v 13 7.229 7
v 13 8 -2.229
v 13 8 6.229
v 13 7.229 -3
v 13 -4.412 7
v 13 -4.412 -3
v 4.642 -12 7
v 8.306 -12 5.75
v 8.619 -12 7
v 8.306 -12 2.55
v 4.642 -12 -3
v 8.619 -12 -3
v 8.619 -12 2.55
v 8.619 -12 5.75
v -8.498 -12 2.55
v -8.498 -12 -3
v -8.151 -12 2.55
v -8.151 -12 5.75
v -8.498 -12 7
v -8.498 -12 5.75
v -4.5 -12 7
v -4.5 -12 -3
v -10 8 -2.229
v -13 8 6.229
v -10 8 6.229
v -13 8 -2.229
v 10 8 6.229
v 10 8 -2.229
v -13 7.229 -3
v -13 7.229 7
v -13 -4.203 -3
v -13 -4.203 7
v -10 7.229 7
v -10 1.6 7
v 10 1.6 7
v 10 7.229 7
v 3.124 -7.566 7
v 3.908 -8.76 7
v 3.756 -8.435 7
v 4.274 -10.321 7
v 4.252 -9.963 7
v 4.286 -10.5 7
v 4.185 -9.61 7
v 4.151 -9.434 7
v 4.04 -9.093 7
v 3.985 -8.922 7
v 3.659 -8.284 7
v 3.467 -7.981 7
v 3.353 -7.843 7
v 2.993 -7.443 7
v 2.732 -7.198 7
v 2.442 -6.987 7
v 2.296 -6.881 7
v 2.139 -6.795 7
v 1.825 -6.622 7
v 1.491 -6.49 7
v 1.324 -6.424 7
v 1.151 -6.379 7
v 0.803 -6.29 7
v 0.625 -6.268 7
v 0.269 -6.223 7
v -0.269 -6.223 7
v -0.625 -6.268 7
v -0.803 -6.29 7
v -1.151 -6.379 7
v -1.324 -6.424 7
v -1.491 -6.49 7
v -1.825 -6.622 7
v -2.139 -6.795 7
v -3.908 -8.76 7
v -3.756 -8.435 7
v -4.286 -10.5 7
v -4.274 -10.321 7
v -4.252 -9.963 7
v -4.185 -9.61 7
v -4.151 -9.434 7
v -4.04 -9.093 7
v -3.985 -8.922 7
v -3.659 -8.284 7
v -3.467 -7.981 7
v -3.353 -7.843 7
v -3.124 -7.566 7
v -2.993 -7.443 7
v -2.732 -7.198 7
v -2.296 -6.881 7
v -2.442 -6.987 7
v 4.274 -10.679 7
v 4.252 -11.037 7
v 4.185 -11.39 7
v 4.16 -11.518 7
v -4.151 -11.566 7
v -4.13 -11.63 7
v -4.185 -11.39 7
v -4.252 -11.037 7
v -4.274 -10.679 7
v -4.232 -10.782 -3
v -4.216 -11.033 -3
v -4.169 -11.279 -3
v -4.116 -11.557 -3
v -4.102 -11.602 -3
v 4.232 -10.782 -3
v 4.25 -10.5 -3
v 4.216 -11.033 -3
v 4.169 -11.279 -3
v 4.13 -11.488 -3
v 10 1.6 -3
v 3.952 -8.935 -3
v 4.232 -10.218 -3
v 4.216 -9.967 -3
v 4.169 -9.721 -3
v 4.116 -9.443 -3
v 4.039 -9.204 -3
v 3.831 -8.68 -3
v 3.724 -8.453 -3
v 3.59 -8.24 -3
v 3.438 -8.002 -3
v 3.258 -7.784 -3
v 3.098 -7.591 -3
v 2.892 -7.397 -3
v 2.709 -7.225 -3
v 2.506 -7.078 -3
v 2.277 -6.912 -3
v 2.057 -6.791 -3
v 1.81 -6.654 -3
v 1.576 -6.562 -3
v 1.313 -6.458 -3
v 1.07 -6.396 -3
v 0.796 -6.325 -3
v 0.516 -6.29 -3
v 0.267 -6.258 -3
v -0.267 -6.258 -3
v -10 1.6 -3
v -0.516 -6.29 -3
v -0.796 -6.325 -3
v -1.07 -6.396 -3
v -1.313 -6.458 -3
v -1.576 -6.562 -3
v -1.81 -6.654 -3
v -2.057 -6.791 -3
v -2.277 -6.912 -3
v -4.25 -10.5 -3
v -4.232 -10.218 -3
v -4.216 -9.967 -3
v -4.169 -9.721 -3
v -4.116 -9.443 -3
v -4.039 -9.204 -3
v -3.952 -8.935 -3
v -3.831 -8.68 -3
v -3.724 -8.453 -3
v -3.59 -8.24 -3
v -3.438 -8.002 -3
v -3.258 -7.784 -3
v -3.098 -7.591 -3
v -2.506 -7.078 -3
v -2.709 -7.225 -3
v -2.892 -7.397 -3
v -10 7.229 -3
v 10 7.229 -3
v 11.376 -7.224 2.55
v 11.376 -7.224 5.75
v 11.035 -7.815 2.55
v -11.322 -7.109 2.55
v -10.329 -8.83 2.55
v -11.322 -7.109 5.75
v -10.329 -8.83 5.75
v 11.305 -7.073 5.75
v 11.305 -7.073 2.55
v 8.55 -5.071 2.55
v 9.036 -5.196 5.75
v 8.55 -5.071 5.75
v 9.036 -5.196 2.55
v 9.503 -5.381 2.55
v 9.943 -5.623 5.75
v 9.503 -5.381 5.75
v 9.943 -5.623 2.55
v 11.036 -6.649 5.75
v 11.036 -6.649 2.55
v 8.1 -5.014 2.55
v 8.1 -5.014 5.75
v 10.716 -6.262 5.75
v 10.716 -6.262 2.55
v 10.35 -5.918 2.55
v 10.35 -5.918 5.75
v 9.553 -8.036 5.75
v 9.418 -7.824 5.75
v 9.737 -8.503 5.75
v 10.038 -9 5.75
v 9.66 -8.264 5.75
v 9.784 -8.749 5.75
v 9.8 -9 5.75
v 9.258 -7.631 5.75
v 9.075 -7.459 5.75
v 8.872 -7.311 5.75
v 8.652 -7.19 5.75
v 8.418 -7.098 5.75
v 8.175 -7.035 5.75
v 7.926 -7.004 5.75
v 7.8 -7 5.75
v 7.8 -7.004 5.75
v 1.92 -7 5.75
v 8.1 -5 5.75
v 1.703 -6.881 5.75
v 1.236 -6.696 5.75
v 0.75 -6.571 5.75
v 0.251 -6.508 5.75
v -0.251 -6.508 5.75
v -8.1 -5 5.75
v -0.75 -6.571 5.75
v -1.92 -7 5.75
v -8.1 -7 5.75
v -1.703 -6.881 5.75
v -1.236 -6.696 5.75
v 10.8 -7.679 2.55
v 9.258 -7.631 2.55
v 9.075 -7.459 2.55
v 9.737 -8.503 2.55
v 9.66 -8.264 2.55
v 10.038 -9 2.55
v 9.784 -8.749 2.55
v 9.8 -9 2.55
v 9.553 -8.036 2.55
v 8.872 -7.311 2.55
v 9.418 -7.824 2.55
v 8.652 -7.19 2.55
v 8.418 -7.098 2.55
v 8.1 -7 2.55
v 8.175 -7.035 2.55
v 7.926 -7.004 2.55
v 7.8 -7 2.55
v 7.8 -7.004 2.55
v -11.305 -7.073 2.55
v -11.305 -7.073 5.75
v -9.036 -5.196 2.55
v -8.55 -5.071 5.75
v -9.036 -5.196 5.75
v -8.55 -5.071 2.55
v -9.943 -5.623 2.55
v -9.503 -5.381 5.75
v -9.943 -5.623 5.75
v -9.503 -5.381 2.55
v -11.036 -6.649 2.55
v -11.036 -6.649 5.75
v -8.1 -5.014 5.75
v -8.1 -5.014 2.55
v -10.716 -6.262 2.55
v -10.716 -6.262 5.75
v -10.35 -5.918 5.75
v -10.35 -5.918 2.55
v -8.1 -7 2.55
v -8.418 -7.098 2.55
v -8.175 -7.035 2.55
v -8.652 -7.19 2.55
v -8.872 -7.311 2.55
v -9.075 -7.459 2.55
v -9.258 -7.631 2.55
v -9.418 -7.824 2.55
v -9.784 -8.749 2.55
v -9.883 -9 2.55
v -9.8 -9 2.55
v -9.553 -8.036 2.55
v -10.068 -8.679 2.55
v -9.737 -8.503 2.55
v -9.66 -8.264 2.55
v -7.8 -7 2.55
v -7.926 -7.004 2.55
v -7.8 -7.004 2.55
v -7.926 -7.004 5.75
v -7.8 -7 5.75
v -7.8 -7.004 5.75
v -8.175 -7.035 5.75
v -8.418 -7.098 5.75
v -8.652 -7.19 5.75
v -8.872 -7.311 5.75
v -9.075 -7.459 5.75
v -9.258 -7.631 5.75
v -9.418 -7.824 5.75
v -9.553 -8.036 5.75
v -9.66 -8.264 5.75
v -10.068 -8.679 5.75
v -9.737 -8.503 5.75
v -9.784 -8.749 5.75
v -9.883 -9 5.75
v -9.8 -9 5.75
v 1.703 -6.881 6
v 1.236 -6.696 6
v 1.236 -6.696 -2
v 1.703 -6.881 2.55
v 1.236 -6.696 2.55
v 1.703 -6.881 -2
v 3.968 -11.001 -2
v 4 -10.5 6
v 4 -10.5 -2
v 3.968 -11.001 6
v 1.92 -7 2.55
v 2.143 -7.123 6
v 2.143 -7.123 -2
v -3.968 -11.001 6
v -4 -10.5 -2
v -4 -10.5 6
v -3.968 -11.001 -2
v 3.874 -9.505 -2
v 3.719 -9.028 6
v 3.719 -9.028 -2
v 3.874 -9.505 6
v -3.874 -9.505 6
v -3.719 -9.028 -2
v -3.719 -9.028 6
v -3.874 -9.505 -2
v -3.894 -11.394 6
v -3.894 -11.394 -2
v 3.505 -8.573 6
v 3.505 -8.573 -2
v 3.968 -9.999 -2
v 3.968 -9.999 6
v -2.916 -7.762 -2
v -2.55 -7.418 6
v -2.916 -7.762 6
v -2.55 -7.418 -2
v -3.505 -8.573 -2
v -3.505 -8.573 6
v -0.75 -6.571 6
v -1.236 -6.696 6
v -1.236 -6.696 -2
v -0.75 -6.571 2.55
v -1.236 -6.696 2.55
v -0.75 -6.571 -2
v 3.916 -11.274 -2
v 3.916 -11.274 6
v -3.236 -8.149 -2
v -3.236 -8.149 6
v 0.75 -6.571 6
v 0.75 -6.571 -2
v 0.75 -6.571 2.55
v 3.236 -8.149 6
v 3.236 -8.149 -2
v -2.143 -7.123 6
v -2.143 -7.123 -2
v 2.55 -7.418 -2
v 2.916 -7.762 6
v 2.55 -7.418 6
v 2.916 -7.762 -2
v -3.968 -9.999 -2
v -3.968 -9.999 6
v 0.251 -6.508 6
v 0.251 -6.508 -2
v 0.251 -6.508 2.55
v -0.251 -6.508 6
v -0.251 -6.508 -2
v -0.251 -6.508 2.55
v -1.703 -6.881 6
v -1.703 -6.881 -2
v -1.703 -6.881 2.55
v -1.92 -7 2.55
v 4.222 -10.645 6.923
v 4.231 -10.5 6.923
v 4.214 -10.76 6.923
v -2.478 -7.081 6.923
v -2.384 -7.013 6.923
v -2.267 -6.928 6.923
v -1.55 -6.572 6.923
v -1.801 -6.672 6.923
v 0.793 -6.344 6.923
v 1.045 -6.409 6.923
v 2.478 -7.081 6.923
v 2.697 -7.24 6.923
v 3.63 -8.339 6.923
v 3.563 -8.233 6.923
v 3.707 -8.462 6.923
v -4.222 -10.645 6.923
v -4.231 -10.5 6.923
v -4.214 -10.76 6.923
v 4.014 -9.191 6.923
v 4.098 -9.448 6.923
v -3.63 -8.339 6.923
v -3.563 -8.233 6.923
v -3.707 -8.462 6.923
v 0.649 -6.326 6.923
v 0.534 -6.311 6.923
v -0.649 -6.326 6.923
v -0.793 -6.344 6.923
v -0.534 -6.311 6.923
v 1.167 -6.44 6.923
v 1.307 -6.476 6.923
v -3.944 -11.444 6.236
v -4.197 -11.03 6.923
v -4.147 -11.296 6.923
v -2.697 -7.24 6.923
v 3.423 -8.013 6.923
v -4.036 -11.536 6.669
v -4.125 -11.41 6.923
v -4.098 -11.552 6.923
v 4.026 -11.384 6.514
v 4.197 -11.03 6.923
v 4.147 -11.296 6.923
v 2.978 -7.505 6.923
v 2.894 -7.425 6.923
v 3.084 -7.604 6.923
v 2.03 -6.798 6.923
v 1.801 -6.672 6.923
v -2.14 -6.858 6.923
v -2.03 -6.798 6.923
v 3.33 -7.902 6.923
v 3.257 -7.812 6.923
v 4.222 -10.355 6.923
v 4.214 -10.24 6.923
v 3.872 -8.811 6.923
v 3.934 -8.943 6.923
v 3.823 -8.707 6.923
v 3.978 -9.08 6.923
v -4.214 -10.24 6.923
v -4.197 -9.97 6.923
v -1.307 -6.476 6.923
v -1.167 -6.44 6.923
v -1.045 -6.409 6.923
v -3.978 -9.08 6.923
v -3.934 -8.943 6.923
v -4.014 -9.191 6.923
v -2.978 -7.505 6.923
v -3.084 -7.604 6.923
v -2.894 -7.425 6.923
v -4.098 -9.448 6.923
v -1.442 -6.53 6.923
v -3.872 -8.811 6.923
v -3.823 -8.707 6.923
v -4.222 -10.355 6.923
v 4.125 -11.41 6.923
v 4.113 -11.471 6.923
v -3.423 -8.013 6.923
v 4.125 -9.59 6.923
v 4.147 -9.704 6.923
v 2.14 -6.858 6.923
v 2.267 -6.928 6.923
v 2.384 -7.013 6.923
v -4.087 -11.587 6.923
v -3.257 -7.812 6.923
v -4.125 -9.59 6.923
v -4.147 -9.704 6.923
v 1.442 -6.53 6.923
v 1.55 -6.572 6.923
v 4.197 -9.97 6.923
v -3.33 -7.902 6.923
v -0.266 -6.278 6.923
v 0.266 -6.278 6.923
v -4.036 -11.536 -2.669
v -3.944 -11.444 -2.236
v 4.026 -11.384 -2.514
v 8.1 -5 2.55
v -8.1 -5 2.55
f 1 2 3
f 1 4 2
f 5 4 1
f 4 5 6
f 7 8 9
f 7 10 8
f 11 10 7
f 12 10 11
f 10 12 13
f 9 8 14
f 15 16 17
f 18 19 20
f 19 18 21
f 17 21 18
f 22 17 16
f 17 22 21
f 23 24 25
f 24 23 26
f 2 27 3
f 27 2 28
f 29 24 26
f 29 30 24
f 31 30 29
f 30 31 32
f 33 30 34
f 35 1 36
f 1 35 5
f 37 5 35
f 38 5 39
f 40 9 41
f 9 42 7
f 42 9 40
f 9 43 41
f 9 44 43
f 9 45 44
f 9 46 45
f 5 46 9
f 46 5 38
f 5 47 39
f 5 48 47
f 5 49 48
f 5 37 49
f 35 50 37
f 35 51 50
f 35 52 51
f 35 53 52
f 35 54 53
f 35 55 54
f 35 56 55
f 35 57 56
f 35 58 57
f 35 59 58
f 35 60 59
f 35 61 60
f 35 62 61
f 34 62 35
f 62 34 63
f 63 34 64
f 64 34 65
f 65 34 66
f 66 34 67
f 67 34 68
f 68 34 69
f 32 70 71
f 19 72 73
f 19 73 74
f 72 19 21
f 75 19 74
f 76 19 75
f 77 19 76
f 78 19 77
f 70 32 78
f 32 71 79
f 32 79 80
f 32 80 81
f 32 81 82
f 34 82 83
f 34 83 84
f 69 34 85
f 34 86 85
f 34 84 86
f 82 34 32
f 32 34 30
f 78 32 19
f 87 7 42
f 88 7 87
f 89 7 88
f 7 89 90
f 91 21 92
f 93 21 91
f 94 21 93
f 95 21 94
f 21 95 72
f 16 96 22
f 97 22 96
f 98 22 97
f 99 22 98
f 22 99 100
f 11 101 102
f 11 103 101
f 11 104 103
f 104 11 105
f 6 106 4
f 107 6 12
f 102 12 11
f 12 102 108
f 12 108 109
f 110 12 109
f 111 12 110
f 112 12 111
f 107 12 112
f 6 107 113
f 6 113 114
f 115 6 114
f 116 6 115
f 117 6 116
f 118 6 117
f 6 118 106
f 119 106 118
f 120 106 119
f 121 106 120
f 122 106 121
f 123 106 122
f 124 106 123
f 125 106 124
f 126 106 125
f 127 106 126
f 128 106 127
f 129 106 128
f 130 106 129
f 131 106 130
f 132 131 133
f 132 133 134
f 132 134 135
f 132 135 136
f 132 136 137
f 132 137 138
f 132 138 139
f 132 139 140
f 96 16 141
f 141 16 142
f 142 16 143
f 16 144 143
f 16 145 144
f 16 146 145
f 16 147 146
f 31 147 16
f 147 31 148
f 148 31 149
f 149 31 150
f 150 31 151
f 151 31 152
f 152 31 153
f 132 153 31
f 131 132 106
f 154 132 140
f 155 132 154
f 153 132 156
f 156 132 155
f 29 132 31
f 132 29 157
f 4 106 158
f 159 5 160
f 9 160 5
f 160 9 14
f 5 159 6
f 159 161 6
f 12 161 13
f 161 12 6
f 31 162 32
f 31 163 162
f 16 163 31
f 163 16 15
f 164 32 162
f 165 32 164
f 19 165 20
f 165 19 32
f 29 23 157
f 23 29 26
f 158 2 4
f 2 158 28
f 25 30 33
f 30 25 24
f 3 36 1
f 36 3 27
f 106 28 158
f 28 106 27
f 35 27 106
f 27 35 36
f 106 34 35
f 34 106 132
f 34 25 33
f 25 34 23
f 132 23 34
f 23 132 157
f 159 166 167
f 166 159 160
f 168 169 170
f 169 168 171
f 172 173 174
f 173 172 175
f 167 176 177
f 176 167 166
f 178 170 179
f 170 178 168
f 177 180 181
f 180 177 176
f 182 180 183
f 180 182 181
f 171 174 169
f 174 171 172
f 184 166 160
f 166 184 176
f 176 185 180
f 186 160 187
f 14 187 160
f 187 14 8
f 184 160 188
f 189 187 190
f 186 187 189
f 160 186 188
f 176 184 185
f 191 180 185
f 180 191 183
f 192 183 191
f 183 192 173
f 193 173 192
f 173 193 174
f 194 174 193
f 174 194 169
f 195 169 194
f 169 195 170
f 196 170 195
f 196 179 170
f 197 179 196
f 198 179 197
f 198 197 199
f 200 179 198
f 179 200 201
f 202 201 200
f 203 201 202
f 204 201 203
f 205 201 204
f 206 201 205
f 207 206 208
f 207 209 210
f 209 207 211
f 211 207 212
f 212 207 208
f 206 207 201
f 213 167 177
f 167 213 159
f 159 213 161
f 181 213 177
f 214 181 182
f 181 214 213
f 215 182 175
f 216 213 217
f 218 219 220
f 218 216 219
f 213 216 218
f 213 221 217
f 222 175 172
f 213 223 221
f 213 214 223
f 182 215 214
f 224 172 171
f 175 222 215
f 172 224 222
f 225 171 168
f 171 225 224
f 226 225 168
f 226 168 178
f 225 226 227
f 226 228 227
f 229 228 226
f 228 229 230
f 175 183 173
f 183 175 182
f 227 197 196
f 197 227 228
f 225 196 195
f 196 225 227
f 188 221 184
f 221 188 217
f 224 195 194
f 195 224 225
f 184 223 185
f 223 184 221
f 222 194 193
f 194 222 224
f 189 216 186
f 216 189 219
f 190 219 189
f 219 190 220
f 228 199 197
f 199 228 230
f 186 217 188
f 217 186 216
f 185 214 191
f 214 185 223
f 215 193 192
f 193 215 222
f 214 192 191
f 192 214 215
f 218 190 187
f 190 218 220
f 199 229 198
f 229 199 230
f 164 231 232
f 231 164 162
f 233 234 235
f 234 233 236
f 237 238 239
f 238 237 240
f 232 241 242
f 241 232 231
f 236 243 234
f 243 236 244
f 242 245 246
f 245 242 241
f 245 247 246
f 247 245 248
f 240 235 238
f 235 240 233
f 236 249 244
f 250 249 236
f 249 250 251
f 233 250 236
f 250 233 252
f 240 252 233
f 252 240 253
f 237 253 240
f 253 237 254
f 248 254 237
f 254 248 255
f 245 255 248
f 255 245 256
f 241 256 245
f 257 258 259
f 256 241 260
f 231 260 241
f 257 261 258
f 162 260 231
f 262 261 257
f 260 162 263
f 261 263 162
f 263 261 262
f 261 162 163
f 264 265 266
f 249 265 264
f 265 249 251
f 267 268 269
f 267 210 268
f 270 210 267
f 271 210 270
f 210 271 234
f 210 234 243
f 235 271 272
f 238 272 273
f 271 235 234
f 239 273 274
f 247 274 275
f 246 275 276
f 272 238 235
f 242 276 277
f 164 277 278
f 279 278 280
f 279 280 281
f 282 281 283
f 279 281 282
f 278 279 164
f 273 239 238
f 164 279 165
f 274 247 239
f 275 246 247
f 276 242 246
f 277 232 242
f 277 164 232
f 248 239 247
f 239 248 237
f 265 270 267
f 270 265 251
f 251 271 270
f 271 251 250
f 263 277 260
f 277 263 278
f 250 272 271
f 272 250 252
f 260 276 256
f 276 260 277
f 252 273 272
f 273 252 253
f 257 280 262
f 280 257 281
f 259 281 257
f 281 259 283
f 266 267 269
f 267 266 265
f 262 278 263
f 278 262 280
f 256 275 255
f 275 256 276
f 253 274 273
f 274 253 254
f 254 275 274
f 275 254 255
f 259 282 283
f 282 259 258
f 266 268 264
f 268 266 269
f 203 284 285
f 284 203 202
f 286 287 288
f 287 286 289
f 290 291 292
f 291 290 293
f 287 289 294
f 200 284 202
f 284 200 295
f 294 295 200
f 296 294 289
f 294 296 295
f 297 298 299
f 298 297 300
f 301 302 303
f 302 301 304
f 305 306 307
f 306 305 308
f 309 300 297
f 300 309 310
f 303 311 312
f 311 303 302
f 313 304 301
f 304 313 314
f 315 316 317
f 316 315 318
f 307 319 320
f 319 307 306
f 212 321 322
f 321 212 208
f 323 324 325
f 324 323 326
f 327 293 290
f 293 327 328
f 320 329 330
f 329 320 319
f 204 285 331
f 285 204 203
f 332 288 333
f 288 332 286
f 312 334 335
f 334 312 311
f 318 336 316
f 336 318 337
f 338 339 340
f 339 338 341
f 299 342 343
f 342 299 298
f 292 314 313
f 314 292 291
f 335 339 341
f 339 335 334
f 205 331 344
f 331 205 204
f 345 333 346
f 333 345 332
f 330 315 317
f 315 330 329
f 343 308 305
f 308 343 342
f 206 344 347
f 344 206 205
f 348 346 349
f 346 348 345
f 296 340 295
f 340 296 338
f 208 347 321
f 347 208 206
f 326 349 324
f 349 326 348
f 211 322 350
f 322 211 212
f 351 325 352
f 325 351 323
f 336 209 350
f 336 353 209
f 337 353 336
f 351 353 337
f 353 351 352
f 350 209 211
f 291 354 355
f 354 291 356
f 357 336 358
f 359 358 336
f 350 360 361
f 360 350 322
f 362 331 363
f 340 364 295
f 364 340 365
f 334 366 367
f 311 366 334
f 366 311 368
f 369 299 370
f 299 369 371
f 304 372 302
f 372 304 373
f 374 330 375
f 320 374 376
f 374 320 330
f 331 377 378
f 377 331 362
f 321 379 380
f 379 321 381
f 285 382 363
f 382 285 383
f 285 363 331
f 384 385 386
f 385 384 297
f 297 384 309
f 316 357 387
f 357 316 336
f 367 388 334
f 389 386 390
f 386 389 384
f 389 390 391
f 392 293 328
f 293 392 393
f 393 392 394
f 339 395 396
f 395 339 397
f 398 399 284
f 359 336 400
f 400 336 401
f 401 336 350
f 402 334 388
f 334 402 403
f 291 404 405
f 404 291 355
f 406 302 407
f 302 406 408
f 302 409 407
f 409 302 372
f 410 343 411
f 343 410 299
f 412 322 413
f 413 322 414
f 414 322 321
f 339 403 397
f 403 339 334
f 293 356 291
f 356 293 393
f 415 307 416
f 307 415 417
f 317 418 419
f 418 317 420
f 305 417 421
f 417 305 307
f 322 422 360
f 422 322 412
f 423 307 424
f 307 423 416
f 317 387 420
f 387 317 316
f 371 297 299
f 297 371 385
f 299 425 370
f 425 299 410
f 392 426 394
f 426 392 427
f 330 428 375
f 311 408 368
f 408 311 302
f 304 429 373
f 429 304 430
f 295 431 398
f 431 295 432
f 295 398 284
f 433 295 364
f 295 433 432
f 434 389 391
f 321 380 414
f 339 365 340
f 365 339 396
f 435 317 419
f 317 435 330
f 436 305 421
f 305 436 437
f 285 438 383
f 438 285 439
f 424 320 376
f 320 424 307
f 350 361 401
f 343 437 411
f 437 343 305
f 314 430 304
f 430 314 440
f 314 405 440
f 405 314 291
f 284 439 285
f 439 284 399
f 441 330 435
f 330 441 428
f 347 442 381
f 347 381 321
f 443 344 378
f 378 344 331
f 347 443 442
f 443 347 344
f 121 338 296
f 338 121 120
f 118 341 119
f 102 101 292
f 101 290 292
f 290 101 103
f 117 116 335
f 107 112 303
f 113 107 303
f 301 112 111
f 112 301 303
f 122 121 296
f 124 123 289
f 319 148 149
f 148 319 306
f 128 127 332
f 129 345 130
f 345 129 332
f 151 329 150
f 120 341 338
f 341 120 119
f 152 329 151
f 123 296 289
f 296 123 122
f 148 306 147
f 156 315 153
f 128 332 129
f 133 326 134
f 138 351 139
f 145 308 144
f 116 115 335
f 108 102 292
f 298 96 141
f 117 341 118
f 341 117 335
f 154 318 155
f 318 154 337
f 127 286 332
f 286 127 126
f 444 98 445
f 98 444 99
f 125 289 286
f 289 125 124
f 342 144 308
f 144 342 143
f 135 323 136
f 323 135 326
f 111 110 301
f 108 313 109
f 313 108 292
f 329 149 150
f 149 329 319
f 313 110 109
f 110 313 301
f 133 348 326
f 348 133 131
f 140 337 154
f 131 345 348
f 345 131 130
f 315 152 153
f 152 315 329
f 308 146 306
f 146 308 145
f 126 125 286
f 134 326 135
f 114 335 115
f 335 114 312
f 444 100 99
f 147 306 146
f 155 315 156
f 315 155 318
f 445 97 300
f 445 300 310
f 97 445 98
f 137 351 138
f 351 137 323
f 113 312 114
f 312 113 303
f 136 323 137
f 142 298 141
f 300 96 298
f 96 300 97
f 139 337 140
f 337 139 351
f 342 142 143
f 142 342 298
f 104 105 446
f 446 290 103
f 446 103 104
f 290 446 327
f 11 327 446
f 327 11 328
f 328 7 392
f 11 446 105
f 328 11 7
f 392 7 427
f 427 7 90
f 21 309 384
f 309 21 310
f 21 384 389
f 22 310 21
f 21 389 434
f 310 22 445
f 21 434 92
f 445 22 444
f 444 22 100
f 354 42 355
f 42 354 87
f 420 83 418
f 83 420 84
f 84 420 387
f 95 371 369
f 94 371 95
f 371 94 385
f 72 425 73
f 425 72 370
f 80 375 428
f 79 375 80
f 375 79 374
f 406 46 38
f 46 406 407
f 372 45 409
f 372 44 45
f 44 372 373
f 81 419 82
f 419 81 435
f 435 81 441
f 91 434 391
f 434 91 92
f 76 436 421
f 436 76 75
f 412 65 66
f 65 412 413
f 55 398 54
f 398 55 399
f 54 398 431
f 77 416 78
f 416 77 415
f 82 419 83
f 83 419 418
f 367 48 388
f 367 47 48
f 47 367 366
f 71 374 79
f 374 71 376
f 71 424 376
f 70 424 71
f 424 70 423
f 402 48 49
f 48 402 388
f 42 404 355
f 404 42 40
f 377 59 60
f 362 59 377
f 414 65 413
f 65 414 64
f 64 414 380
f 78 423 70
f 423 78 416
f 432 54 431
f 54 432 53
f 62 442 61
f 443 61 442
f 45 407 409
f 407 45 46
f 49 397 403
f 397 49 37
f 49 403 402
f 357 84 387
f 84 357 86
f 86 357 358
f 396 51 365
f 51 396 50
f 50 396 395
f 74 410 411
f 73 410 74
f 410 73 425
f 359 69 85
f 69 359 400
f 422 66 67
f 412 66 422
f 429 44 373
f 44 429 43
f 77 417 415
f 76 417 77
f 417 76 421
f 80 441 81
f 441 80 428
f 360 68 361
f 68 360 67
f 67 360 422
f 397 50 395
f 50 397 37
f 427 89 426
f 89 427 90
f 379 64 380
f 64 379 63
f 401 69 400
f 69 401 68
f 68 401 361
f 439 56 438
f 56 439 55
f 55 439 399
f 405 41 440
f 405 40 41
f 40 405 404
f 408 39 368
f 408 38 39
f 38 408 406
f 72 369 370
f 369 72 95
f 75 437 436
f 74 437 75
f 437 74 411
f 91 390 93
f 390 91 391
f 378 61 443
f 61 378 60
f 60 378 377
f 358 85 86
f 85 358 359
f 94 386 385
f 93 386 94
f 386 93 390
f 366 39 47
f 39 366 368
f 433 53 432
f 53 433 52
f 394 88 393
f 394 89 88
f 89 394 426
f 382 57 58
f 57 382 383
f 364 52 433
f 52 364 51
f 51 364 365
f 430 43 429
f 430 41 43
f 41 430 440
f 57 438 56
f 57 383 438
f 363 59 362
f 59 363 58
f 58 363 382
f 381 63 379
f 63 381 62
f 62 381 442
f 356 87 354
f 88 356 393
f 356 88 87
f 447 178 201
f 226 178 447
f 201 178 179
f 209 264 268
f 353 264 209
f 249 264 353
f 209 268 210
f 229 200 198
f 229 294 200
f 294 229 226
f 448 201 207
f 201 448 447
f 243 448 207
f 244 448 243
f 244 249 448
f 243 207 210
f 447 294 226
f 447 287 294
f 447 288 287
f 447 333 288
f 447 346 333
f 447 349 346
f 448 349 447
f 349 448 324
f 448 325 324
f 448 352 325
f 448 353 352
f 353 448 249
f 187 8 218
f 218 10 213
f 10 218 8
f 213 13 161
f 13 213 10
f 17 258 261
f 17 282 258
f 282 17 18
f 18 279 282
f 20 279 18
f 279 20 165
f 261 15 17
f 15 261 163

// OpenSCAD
// PRUSA iteration4
// Y holder front
// GNU GPL v3
// Josef Průša <iam@josefprusa.cz> and contributors
// http://www.reprap.org/wiki/Prusa_Mendel
// http://prusamendel.org

module ziptie_round_edge()
{
    difference()
    {
        translate([0,0,0]) rotate([90,0,0]) cylinder( h=3.2, r=4, $fn=50 );  
        translate([0,1,0]) rotate([90,0,0]) cylinder( h=5, r=2, $fn=50 );  
        translate([-10,-4,0]) cube([20,5,5]);
        translate([-20,-4,-13]) cube([20,5,20]);
    }
}

module part()    
{

    difference()
    {
        union()
        {
            // body block
            difference() {
                translate([-13,-3,-8]) cube([26,10,20]);
                
                // upper corners
                translate([4,-3.5,20]) rotate([0,60,0]) cube([20,30,20]);
                translate([-21.2,-3.5,30]) rotate([0,120,0]) cube([20,30,20]);
                translate([-15,-3.3,-14]) rotate([45,0,0]) cube([30,5,5]);
                translate([15,7.3,-14]) rotate([45,0,180]) cube([30,5,5]);

                //switch
                 translate([-10, -3.1, -8.1]) cube([20, 10.5, 6.5]);
            }
        }

        // y-axis cut
        translate([0,11,10.5]) rotate([90,0,0]) cylinder( h=14, r=4, $fn=50 );
        translate([0,8,10.5]) rotate([90,0,0]) cylinder( h=2, r1=4.5, r2=4, $fn=50 );
        translate([0,-2,10.5]) rotate([90,0,0]) cylinder( h=2, r1=4, r2=4.5, $fn=50 );
        translate([-7,-4,14.5]) rotate([0,45,0]) cube([10,20,10]);
        translate([0,8,10.5]) rotate([90,0,0]) cylinder( h=1.4, r1=5, r2=4, $fn=50 );

        // ziptie
        translate([7.8,5.75,9]) ziptie_round_edge();
        translate([-7.8,2.55,9]) rotate([0,0,180]) ziptie_round_edge();
        translate([-8.1,2.55,5]) cube([16.2,3.2,2]);
        translate([0.8,2.55,25]) rotate([0,60,0]) cube([20,3.2,2]);
        translate([-1.8,2.55,27]) rotate([0,120,0]) cube([20,3.2,2]);
    }
}


rotate([90,0,0])
part();
